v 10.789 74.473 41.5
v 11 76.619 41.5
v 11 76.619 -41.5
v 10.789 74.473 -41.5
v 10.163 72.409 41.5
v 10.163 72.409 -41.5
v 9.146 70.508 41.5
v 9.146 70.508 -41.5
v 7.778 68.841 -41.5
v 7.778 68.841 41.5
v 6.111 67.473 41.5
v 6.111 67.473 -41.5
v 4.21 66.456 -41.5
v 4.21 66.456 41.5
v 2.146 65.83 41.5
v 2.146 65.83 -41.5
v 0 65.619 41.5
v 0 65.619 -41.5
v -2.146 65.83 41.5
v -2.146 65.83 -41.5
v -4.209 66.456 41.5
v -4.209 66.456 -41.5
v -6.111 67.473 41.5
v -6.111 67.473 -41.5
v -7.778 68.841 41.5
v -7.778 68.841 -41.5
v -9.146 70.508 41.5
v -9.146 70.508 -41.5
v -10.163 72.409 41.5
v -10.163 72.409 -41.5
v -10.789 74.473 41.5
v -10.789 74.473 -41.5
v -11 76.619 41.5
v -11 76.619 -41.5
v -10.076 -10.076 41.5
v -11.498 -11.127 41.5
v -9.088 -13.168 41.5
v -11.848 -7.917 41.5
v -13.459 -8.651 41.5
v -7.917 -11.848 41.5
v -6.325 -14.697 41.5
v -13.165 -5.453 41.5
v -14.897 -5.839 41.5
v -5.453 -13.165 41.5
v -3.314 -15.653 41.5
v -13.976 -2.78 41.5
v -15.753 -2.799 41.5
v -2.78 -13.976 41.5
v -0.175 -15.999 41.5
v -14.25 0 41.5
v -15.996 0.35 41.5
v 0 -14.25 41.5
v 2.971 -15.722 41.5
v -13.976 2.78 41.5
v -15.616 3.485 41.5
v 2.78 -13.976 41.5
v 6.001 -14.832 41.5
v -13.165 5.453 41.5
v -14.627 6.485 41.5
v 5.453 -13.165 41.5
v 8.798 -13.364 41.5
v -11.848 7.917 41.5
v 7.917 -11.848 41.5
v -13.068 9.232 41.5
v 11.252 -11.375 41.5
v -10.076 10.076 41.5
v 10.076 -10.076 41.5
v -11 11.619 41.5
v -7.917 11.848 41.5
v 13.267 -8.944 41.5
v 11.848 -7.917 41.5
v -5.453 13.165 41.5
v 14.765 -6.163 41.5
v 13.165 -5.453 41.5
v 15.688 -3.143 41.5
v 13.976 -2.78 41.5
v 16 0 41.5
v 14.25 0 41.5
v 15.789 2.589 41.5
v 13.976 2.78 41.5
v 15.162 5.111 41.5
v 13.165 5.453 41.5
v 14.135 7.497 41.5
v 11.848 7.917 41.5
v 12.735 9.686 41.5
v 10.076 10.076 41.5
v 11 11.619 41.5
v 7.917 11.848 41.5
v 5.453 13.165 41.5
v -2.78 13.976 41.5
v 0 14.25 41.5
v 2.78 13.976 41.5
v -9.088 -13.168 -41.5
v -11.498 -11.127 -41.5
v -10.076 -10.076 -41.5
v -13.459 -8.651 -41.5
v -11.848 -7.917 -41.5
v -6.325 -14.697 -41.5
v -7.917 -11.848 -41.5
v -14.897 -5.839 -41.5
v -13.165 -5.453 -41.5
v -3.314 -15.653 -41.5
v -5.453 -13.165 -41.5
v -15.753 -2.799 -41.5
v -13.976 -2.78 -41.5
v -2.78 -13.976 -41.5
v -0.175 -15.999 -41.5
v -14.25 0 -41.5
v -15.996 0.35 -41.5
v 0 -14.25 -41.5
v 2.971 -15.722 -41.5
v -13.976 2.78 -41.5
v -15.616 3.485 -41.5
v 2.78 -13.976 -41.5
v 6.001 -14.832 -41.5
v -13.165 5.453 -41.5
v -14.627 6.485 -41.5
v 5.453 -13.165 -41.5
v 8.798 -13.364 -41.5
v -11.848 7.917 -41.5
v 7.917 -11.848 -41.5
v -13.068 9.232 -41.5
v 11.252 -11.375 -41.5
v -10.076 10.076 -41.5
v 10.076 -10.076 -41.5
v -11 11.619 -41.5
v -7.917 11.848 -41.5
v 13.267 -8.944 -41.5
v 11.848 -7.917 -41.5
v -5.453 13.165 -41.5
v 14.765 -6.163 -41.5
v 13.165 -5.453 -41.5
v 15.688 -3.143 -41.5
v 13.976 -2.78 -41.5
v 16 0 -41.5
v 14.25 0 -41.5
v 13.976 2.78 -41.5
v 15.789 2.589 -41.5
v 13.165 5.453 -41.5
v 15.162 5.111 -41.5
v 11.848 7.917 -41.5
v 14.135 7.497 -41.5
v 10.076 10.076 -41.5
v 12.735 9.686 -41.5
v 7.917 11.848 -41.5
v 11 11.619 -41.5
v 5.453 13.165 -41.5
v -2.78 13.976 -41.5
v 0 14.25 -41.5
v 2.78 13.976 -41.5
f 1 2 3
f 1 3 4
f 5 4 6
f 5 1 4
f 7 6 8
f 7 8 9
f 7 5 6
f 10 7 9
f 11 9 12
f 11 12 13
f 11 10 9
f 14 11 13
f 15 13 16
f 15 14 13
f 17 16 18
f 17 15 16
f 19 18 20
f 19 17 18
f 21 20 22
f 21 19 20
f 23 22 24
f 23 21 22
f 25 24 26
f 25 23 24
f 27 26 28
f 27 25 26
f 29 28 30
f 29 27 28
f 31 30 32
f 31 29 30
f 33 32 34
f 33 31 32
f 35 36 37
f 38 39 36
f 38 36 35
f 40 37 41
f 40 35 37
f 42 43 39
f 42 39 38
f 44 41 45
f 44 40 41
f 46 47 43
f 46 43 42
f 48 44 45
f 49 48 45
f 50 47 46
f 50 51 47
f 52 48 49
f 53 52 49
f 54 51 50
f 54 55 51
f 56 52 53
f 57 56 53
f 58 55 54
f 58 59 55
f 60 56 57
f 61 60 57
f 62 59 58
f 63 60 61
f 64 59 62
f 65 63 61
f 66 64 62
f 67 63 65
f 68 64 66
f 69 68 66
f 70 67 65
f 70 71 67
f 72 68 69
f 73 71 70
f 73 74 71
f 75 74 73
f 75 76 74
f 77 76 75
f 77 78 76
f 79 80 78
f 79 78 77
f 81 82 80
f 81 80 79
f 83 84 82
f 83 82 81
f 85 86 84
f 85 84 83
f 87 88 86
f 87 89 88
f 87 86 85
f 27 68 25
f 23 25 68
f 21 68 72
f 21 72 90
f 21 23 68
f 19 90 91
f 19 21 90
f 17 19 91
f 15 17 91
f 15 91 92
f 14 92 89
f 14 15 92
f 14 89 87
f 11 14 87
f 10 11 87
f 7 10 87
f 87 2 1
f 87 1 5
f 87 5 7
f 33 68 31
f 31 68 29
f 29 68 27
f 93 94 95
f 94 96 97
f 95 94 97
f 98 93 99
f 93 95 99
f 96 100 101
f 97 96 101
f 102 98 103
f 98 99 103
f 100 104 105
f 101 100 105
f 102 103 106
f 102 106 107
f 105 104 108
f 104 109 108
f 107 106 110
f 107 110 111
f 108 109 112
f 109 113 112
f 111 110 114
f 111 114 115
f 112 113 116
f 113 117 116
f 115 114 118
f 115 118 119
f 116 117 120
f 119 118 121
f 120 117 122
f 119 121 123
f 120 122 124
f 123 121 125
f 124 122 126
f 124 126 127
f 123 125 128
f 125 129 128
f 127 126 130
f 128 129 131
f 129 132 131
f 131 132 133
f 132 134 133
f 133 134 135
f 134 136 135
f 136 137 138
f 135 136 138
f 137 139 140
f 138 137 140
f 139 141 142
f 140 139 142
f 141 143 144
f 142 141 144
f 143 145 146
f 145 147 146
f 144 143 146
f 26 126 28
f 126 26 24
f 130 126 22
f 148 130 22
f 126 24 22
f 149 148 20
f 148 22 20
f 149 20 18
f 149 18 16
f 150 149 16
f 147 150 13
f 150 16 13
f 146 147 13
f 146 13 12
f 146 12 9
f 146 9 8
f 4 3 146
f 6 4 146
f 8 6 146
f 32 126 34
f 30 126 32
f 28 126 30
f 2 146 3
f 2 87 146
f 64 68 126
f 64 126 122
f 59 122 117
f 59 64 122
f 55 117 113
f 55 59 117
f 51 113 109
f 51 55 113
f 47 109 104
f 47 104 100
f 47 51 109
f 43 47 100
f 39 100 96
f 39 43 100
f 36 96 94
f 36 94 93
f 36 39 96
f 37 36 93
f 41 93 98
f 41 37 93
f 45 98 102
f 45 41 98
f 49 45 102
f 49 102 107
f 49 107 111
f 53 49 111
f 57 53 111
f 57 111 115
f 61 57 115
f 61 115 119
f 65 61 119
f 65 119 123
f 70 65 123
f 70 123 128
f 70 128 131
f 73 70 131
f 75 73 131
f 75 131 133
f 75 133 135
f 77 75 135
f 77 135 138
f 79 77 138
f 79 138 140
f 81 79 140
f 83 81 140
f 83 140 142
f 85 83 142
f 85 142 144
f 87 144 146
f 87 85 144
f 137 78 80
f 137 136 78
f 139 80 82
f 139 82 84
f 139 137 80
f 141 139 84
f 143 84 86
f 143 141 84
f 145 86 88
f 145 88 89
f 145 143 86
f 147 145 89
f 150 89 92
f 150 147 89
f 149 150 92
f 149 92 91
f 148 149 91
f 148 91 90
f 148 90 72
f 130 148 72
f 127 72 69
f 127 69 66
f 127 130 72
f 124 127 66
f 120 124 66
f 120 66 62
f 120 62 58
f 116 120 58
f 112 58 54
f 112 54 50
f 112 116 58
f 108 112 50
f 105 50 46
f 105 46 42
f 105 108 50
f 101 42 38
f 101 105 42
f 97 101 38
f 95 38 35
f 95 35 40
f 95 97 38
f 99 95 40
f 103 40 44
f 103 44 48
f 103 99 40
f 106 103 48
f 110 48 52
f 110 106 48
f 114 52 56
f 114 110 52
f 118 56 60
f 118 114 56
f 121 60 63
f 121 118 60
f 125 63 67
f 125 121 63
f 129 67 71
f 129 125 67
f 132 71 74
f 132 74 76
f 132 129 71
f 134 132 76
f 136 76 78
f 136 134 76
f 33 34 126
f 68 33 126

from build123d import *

# Parameters (mm, degrees)
F0_R     = 14.25
F1_DEPTH = 41.5


# Not quite as in the source:
# - ends of sketch curves that miss each other by under 0.0002 mm in the source are joined


with BuildPart() as f1:
    # F0 (on Top) → F1 (new body, symmetric)
    with BuildSketch(Plane.XY):
        with BuildLine():
            ThreePointArc((-11.0000361821, 11.6189157839), (-4.98249e-05, 15.9999999999), (10.9999638179, 11.6189842932))
            Line((10.9999638179, 11.6189842932), (10.9999638179, 76.6189842932))
            ThreePointArc((10.9999638179, 76.6189842932), (3.42546e-05, 65.6189519658), (-10.9999638181, 76.6189157839))
            Line((-10.9999638181, 76.6189157839), (-11.0000361821, 11.6189157839))
        make_face()
        with BuildLine():
            ThreePointArc((-11.0000361821, 11.6189157839), (-6.3245324367, -14.6969483042), (16, 0))
            ThreePointArc((16, 0), (14.6969286092, 6.3245782039), (10.9999638179, 11.6189842932))
            ThreePointArc((10.9999638179, 11.6189842932), (-4.98249e-05, 15.9999999999), (-11.0000361821, 11.6189157839))
        make_face()
        Circle(F0_R, mode=Mode.SUBTRACT)
    extrude(amount=F1_DEPTH, both=True)


solid = f1.part
